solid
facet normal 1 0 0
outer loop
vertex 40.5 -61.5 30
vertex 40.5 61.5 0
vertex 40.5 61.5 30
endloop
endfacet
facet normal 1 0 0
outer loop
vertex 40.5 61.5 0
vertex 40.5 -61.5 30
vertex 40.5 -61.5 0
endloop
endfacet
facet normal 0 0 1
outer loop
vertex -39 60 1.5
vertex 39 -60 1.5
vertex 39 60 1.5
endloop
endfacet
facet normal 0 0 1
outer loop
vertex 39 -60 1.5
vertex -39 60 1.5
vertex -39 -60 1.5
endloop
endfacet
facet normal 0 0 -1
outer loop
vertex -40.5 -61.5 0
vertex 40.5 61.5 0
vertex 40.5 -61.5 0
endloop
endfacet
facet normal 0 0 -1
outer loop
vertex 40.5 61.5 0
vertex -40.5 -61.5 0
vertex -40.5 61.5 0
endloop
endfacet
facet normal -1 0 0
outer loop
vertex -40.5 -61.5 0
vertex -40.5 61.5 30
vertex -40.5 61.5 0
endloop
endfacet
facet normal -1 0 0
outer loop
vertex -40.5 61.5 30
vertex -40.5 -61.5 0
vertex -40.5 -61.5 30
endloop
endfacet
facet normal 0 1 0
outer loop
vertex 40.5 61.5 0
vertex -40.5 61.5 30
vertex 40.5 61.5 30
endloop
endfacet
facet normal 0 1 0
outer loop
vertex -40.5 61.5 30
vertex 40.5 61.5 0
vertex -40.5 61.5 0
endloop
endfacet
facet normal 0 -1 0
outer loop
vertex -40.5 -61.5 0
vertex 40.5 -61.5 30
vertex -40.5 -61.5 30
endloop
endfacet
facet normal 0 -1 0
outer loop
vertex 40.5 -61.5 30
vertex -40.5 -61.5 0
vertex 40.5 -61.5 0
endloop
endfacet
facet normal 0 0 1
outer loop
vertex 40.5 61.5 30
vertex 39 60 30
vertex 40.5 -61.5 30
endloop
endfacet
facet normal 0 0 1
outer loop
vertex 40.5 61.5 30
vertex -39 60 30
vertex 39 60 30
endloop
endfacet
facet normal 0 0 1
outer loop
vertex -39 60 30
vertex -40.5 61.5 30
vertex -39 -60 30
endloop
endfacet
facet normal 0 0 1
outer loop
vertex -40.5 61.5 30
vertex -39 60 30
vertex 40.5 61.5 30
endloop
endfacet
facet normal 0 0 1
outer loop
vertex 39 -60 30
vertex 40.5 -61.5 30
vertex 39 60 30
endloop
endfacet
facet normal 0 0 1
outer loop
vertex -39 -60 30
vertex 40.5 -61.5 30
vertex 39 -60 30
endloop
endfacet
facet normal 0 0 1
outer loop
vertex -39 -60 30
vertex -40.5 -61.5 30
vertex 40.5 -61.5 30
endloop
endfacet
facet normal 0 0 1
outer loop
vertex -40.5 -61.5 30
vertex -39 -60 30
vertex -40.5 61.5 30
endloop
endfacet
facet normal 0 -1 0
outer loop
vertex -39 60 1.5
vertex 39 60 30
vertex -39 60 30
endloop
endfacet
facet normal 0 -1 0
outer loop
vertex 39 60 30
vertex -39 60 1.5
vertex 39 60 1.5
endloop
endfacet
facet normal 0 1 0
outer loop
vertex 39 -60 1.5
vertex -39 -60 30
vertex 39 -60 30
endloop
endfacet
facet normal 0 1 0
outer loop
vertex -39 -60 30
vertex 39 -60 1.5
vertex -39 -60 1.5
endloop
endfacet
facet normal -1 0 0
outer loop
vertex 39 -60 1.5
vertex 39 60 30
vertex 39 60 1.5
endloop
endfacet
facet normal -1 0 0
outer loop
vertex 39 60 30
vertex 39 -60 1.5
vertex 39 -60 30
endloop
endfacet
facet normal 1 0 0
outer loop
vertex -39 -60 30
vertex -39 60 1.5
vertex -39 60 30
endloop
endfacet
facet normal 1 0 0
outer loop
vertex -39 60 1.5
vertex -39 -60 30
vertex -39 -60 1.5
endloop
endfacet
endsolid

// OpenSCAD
$fn = 50;


difference() {
	union() {
		translate(v = [-40.5000000000, -61.5000000000, 0]) {
			cube(size = [81, 123, 1.5000000000]);
		}
		translate(v = [-40.5000000000, 60.0000000000, 0]) {
			cube(size = [81, 1.5000000000, 30]);
		}
		translate(v = [-40.5000000000, -61.5000000000, 0]) {
			cube(size = [81, 1.5000000000, 30]);
		}
		translate(v = [39.0000000000, -61.5000000000, 0]) {
			cube(size = [1.5000000000, 123, 30]);
		}
		translate(v = [-40.5000000000, -61.5000000000, 0]) {
			cube(size = [1.5000000000, 123, 30]);
		}
	}
	union();
}
